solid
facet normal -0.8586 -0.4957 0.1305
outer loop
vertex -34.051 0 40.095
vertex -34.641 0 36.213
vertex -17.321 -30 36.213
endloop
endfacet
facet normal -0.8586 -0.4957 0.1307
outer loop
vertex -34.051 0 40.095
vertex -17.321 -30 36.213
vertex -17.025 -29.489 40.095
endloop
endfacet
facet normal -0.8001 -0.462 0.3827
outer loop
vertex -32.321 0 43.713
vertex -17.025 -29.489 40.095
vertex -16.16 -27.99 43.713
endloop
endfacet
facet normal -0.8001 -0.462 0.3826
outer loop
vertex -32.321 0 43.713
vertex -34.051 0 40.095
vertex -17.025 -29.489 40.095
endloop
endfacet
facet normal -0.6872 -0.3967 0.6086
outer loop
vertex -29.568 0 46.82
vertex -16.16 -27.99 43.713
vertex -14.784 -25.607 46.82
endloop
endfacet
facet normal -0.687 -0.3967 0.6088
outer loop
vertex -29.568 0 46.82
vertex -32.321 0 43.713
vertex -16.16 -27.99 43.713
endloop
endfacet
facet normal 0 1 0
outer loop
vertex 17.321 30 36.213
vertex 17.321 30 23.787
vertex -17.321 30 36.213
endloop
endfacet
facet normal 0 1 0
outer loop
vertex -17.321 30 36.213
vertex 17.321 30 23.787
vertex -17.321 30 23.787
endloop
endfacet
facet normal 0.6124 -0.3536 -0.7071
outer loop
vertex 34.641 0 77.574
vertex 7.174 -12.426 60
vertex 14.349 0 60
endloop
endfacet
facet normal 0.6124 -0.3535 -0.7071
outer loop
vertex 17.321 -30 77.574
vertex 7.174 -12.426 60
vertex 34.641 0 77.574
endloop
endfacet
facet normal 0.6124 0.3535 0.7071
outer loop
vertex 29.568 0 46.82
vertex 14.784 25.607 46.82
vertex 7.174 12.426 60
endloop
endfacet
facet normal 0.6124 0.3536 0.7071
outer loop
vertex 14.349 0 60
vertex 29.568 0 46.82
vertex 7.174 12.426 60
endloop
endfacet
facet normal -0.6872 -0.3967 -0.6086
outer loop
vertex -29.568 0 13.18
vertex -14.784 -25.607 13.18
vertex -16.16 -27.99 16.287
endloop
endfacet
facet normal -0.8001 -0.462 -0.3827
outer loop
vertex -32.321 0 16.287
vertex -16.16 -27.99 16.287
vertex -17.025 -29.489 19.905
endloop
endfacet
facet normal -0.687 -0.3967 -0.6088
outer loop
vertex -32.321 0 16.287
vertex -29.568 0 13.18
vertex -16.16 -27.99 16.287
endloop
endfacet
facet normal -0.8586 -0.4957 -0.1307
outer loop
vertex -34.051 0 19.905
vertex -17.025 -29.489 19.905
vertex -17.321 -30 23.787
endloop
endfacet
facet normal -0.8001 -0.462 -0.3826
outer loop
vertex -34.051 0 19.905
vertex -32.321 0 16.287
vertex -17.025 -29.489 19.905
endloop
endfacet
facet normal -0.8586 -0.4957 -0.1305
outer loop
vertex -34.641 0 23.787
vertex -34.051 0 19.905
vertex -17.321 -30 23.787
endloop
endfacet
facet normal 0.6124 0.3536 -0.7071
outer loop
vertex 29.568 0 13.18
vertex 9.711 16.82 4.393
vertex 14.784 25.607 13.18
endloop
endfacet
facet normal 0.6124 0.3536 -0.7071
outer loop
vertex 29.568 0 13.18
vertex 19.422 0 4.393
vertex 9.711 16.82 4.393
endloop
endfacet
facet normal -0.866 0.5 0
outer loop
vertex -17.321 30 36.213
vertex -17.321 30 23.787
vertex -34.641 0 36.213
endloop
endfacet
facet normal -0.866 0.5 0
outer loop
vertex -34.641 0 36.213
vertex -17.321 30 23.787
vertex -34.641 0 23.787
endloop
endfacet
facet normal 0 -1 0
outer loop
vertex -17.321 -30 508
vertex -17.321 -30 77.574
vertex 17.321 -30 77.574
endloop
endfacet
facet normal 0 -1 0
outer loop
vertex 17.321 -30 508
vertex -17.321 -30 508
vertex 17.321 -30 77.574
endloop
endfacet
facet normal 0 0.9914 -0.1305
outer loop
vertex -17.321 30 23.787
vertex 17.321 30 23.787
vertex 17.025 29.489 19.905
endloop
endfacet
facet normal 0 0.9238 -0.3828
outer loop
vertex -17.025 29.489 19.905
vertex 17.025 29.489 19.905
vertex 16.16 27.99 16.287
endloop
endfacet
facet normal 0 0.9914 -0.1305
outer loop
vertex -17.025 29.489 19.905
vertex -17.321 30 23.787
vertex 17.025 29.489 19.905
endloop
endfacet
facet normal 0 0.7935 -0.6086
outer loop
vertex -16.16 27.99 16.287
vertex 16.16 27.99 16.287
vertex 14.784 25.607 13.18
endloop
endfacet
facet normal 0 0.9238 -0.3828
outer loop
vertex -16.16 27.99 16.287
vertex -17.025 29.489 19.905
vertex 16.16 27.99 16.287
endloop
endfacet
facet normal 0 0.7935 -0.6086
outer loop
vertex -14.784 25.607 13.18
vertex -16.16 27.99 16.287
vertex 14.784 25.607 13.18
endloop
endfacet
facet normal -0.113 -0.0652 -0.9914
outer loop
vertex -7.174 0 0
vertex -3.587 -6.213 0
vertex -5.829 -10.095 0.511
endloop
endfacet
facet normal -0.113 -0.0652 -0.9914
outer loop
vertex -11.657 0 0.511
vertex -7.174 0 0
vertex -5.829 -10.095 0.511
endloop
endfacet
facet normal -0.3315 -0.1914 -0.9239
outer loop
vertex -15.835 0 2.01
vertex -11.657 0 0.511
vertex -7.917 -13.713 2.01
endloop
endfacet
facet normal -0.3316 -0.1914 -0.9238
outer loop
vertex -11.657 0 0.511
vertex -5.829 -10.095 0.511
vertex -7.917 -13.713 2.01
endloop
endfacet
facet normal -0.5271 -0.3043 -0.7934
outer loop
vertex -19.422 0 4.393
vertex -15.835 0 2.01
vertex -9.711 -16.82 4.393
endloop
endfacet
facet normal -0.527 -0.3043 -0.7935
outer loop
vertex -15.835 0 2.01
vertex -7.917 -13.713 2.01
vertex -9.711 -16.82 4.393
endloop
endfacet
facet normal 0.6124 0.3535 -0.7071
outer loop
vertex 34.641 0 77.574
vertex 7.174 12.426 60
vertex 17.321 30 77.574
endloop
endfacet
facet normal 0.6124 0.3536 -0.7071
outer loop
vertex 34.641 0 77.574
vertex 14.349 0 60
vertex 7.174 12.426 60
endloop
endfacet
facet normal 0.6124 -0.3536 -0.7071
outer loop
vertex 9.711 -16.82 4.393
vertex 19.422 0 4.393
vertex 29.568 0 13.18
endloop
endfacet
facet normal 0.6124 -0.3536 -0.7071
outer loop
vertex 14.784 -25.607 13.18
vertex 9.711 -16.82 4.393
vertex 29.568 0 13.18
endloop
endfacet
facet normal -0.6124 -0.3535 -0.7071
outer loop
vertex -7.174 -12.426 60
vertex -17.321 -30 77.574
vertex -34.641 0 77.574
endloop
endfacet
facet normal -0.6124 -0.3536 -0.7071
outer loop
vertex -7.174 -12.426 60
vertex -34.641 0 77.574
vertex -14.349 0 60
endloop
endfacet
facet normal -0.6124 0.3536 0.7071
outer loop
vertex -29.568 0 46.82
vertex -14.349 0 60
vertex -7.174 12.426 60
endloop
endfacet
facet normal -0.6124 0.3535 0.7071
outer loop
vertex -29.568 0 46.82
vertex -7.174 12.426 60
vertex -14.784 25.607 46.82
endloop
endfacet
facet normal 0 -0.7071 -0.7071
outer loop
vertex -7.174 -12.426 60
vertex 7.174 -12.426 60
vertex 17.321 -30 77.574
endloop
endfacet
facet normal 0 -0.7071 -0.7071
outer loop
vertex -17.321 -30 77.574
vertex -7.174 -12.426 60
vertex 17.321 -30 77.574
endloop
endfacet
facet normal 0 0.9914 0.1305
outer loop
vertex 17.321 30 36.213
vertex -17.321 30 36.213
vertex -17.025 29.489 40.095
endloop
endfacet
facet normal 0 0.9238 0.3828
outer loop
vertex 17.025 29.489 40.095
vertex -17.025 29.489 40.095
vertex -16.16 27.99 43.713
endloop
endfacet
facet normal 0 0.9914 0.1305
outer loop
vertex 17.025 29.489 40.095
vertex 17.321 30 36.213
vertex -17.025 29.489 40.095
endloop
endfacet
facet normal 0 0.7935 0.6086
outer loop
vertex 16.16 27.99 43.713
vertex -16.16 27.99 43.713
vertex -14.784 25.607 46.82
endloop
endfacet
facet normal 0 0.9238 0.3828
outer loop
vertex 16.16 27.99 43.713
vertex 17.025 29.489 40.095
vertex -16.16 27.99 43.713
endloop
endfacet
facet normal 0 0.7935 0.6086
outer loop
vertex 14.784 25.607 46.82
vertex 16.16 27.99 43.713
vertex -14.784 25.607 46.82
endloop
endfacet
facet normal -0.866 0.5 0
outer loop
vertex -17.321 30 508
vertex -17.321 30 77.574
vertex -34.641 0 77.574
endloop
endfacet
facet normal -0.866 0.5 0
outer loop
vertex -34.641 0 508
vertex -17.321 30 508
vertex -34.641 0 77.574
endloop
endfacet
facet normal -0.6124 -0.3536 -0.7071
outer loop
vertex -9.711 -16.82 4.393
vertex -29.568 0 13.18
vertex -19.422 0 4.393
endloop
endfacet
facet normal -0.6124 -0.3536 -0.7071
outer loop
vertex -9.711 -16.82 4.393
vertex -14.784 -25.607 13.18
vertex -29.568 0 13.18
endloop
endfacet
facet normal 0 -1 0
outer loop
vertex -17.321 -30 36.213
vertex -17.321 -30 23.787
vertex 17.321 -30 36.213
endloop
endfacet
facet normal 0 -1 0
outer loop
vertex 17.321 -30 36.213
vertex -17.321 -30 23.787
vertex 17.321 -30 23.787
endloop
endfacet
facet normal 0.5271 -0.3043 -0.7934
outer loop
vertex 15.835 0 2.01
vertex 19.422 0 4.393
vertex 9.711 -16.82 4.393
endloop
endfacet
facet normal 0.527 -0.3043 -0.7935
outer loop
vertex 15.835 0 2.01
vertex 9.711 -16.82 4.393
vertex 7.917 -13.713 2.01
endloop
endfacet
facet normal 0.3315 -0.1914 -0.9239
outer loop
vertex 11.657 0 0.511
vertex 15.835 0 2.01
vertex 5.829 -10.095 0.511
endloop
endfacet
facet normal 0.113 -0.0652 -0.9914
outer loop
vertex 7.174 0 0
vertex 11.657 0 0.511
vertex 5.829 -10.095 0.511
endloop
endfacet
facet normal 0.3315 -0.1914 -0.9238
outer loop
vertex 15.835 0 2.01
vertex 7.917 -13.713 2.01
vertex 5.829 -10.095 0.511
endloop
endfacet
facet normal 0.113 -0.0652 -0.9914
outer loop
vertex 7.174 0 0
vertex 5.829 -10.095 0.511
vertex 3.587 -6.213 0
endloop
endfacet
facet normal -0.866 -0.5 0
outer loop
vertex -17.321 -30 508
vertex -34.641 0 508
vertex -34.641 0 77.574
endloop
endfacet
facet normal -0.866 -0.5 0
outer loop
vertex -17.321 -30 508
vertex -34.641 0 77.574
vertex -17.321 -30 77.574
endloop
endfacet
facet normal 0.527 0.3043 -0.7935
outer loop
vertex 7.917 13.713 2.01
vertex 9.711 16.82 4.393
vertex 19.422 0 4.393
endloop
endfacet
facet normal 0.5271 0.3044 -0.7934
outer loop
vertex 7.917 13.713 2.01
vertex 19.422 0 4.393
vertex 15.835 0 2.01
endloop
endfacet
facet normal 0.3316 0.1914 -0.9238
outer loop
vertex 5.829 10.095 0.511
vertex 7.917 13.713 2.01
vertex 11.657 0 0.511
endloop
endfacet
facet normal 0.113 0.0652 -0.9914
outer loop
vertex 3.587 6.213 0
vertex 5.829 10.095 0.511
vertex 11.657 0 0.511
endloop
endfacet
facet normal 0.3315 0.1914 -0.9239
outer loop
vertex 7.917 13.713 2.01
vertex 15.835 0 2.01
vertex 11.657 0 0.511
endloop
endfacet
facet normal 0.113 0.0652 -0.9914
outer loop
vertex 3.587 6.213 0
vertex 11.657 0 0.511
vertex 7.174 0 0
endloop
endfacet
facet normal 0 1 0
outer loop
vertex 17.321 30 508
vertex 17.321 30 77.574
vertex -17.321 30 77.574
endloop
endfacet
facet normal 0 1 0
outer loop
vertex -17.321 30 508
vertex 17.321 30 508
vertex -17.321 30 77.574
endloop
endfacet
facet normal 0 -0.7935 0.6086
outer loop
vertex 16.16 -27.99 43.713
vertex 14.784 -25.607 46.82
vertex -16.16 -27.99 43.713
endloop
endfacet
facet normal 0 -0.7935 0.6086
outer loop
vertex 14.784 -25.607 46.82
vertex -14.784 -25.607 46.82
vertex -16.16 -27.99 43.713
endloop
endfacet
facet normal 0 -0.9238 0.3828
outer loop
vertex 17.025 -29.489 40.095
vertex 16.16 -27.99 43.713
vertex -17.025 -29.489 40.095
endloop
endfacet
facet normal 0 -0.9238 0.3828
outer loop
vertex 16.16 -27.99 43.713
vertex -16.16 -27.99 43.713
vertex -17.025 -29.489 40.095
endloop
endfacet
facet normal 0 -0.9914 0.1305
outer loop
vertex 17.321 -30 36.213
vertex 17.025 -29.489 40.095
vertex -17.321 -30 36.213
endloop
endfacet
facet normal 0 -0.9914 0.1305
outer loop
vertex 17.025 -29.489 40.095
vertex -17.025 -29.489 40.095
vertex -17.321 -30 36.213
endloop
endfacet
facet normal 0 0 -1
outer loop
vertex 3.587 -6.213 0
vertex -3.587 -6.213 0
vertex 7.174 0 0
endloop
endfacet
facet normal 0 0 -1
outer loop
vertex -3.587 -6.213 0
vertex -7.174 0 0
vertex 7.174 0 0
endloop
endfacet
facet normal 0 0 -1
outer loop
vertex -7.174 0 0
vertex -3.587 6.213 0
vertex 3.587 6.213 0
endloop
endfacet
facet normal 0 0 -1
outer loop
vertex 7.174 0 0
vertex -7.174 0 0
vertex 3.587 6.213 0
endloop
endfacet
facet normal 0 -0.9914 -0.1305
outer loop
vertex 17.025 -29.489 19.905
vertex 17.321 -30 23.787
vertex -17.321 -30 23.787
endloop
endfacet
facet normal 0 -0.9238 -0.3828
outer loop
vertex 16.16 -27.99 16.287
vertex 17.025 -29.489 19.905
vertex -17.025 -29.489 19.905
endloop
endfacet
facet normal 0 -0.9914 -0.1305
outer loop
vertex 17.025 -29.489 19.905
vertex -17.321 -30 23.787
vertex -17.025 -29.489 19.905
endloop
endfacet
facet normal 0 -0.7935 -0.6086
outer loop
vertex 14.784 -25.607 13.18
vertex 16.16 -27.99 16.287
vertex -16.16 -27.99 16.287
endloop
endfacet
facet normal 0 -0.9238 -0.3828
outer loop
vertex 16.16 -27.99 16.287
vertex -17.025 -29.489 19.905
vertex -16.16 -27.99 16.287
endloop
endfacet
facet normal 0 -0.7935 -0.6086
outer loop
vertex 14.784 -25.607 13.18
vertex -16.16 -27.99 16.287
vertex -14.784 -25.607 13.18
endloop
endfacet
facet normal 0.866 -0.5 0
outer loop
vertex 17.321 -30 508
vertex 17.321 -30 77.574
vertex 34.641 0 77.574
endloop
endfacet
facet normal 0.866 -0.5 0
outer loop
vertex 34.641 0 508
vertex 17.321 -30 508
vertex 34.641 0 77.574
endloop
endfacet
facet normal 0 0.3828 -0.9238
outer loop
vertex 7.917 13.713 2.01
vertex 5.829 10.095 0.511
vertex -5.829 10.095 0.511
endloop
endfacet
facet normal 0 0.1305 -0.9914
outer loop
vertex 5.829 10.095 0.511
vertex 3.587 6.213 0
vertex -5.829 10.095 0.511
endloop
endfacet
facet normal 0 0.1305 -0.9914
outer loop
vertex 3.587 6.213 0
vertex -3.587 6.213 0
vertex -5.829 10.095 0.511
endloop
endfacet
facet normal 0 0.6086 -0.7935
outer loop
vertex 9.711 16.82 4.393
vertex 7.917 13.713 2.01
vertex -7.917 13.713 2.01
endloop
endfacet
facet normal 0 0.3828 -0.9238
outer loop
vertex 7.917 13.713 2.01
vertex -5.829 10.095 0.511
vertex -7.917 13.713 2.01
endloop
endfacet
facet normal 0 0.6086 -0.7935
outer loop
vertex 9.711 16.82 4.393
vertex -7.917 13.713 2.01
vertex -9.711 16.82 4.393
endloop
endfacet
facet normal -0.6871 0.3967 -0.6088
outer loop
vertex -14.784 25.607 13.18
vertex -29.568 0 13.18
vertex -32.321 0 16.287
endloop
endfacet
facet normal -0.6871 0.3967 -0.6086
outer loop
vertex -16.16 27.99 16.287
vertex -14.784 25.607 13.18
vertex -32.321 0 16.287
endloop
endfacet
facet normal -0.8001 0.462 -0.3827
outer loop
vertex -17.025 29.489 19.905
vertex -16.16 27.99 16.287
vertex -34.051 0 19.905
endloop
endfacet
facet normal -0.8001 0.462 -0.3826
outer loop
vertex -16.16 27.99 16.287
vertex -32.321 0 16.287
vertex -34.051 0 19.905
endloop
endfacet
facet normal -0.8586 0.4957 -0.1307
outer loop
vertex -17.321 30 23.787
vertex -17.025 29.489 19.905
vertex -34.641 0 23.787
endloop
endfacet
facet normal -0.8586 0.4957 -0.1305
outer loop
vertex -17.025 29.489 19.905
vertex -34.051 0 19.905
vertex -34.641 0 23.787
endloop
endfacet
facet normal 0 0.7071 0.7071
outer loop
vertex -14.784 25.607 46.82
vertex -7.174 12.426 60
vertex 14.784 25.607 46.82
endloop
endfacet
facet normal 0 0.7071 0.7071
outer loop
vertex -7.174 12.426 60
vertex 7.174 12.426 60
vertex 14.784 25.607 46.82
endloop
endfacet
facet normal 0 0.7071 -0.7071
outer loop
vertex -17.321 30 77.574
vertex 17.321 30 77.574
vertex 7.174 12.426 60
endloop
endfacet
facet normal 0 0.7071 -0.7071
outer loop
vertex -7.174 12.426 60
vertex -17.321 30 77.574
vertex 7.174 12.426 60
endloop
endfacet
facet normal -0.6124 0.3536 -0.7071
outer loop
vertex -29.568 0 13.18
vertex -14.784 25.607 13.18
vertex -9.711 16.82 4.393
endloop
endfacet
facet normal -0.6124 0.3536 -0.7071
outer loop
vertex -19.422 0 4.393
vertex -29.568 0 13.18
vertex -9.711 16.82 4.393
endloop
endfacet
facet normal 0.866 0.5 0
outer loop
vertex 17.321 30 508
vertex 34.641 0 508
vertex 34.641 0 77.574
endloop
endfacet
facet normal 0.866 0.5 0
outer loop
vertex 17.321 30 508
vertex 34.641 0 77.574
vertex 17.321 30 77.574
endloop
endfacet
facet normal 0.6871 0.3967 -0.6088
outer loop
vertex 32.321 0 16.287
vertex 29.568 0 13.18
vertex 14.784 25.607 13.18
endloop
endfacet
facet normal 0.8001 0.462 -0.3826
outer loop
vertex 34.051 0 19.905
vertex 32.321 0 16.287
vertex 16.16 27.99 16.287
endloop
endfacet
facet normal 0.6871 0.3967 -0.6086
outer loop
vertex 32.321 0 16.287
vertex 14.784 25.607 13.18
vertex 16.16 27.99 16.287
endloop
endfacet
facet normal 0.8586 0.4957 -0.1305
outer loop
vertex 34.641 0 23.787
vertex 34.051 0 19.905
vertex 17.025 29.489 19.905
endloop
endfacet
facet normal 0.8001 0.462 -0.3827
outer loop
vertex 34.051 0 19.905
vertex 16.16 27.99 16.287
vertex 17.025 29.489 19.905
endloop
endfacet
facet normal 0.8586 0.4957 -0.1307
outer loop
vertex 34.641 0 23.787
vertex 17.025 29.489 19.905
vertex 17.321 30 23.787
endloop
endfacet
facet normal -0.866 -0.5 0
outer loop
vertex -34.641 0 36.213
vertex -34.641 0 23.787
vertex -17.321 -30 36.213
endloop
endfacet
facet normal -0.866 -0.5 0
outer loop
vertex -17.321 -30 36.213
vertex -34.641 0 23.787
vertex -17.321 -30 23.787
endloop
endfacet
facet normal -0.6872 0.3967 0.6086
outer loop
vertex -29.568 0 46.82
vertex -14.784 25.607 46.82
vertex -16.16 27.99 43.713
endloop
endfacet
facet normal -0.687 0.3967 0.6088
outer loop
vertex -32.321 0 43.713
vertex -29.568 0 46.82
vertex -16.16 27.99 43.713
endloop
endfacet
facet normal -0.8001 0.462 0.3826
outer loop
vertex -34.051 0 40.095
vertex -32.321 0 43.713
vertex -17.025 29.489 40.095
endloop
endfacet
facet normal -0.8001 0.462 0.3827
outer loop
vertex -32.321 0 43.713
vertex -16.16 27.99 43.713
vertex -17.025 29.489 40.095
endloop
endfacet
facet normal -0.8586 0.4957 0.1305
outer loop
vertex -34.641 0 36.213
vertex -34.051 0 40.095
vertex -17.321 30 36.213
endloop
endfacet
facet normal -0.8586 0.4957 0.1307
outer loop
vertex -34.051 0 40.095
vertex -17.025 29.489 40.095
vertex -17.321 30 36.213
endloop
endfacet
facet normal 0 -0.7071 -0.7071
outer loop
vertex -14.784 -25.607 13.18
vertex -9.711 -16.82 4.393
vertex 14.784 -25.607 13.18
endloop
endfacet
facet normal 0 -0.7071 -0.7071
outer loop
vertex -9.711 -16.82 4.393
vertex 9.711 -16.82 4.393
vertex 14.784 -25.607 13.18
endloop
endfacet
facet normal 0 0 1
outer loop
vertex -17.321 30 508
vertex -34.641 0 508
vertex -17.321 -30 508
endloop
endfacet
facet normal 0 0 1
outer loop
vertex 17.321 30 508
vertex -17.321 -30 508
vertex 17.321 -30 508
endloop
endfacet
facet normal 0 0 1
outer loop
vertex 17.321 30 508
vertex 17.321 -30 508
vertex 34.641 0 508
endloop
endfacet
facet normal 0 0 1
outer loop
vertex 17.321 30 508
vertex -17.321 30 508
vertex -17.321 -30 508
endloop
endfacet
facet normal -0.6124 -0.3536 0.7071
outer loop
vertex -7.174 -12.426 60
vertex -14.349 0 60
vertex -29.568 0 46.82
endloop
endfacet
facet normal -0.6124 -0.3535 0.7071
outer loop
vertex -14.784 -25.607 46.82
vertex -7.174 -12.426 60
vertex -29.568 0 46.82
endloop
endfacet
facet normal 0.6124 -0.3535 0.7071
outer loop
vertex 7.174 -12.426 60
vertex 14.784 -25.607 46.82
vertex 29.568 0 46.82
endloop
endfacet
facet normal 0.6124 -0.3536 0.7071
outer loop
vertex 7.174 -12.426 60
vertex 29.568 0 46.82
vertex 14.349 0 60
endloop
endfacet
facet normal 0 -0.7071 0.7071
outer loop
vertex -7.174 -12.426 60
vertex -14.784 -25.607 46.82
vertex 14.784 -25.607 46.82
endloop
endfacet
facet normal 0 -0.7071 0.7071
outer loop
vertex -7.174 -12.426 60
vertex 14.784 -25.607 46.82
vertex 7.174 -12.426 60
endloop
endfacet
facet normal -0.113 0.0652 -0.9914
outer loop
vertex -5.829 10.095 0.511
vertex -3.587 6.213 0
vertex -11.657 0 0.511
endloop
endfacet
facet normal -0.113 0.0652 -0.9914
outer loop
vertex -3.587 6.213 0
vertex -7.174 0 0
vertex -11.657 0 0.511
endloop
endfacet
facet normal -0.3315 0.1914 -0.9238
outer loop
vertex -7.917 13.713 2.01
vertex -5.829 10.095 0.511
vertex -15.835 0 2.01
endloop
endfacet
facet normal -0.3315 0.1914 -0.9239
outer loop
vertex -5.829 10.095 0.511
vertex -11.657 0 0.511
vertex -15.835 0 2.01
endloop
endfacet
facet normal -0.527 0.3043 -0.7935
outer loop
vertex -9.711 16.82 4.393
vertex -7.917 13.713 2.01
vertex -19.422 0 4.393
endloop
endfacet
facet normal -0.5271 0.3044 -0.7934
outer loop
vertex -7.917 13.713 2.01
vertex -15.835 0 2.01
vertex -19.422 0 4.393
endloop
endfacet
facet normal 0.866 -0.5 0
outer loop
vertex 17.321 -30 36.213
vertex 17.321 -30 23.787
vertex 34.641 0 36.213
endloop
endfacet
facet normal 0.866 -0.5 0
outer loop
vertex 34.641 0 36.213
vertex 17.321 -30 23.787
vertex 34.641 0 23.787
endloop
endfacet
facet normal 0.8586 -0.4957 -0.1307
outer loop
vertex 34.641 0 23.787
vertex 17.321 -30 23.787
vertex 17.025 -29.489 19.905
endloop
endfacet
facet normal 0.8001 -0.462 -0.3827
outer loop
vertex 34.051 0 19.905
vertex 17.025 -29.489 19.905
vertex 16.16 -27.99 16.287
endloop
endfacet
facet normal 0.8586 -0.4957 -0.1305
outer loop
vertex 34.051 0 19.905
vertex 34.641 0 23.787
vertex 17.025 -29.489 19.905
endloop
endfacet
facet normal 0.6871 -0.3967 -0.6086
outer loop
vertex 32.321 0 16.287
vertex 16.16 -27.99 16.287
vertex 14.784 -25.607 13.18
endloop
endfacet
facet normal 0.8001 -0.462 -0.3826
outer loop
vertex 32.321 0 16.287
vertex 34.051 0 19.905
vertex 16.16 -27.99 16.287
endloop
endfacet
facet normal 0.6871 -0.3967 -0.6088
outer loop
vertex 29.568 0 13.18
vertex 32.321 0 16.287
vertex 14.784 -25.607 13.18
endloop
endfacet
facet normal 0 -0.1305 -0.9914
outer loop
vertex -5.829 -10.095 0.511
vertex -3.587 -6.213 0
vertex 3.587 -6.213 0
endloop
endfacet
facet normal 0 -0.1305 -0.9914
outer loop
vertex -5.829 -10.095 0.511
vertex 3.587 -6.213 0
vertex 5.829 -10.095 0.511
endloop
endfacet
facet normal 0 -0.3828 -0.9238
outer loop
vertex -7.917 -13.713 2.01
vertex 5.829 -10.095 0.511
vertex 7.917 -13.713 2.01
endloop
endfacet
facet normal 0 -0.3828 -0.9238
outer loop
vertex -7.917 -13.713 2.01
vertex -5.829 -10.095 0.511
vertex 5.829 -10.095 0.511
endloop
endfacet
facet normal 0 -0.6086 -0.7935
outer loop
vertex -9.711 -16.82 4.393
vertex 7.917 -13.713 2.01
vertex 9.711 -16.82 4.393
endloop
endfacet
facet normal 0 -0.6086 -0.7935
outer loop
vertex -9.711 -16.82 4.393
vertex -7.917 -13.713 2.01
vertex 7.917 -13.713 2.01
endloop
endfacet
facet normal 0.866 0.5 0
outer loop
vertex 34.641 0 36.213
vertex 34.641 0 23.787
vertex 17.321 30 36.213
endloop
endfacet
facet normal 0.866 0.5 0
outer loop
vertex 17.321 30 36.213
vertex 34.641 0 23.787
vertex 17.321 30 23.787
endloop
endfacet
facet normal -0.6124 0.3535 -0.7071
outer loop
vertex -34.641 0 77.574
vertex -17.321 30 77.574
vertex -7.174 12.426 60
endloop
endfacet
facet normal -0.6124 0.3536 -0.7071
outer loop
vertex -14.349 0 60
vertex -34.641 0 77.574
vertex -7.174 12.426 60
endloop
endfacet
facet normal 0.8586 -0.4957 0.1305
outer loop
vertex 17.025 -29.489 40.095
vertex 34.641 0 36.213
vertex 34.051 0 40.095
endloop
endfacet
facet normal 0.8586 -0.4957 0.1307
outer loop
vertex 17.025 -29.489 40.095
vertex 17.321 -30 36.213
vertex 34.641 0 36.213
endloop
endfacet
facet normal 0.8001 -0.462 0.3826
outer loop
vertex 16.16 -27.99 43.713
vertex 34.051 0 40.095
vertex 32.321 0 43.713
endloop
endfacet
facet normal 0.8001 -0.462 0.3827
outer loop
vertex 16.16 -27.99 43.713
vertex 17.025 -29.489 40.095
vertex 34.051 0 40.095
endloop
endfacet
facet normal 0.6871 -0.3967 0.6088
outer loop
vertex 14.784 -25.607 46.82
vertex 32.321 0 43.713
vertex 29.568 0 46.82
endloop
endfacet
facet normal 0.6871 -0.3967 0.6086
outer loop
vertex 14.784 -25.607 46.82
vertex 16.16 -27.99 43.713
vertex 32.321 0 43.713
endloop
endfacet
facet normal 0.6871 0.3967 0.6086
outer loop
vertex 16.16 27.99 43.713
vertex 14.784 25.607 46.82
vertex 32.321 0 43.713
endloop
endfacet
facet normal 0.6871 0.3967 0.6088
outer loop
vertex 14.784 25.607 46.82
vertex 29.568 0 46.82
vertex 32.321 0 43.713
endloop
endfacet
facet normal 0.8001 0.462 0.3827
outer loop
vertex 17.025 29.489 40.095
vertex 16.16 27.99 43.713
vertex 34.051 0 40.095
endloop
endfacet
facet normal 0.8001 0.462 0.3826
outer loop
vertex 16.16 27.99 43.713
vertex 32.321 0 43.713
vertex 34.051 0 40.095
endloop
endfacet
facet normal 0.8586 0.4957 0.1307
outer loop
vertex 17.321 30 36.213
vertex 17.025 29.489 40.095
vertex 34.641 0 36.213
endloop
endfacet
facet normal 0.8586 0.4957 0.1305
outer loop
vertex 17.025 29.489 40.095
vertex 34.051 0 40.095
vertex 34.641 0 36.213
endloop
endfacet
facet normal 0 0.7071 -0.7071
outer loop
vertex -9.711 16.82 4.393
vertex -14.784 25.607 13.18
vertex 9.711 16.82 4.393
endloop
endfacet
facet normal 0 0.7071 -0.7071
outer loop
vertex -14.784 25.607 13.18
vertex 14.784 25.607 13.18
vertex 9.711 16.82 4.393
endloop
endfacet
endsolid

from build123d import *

# Parameters (mm, degrees)
F1_DEPTH      = 508
F7_DEPTH      = 34.6420161514
F7_DEPTH_BACK = 34.6420161514
F8_DEPTH      = 43.3022701892
F8_DEPTH_BACK = 43.3022701892
F9_DEPTH      = 43.3022701892
F9_DEPTH_BACK = 43.3022701892
F10_R         = 15


with BuildPart() as f1:
    # F0 (on Top) → F1 (new body)
    with BuildSketch(Plane.XY):
        Polygon((17.3205080757, 30), (-17.3205080757, 30), (-34.6410161514, 0), (-17.3205080757, -30), (17.3205080757, -30), (34.6410161514, 0), align=None)
    extrude(amount=F1_DEPTH)

    # F4 (on Right) → F7 (cut, two sides)
    with BuildSketch(Plane.YZ) as f7_sk:
        Polygon((12.4264068712, 60), (30, 42.4264068712), (30, 77.5735931288), align=None)
        Polygon((-30, 77.5735931288), (-30, 42.4264068712), (-12.4264068712, 60), align=None)
        Polygon((12.4264068712, 0), (-12.4264068712, 0), (-30, 17.5735931288), (-30, -5), (30, -5), (30, 17.5735931288), align=None)
    extrude(amount=F7_DEPTH, mode=Mode.SUBTRACT)
    extrude(f7_sk.sketch, amount=-F7_DEPTH_BACK, mode=Mode.SUBTRACT)

    # F5 (on mid) → F8 (cut, two sides)
    with BuildSketch(Plane(origin=(0, 0, 0), x_dir=(-0.8660254038, -0.5, 0), z_dir=(-0.5, 0.8660254038, 0))) as f8_sk:
        Polygon((12.4264068712, 60), (30, 42.4264068712), (30, 77.5735931288), align=None)
        Polygon((-30, 77.5735931288), (-30, 42.4264068712), (-12.4264068712, 60), align=None)
        Polygon((12.4264068712, 0), (-12.4264068712, 0), (-30, 17.5735931288), (-30, -5), (30, -5), (30, 17.5735931288), align=None)
    extrude(amount=F8_DEPTH, mode=Mode.SUBTRACT)
    extrude(f8_sk.sketch, amount=-F8_DEPTH_BACK, mode=Mode.SUBTRACT)

    # F6 (on mid) → F9 (cut, two sides)
    with BuildSketch(Plane(origin=(0, 0, 0), x_dir=(-0.8660254038, 0.5, 0), z_dir=(0.5, 0.8660254038, 0))) as f9_sk:
        Polygon((12.4264068712, 60), (30, 42.4264068712), (30, 77.5735931288), align=None)
        Polygon((-30, 77.5735931288), (-30, 42.4264068712), (-12.4264068712, 60), align=None)
        Polygon((12.4264068712, 0), (-12.4264068712, 0), (-30, 17.5735931288), (-30, -5), (30, -5), (30, 17.5735931288), align=None)
    extrude(amount=F9_DEPTH, mode=Mode.SUBTRACT)
    extrude(f9_sk.sketch, amount=-F9_DEPTH_BACK, mode=Mode.SUBTRACT)

    # F10
    f10_edges = [f1.edges().sort_by_distance(p)[0] for p in [
        (-25.980762, -15, 17.573593),
        (0, -30, 17.573593),
        (25.980762, -15, 17.573593),
        (25.980762, 15, 17.573593),
        (0, 30, 17.573593),
        (-25.980762, 15, 17.573593),
        (25.980762, 15, 42.426407),
        (25.980762, -15, 42.426407),
        (0, 30, 42.426407),
        (-25.980762, 15, 42.426407),
        (0, -30, 42.426407),
        (-25.980762, -15, 42.426407),
        (0, -12.426407, 0),
        (10.761584, -6.213203, 0),
        (10.761584, 6.213203, 0),
        (0, 12.426407, 0),
        (-10.761584, 6.213203, 0),
        (-10.761584, -6.213203, 0),
    ]]
    fillet(f10_edges, radius=F10_R)


solid = f1.part
